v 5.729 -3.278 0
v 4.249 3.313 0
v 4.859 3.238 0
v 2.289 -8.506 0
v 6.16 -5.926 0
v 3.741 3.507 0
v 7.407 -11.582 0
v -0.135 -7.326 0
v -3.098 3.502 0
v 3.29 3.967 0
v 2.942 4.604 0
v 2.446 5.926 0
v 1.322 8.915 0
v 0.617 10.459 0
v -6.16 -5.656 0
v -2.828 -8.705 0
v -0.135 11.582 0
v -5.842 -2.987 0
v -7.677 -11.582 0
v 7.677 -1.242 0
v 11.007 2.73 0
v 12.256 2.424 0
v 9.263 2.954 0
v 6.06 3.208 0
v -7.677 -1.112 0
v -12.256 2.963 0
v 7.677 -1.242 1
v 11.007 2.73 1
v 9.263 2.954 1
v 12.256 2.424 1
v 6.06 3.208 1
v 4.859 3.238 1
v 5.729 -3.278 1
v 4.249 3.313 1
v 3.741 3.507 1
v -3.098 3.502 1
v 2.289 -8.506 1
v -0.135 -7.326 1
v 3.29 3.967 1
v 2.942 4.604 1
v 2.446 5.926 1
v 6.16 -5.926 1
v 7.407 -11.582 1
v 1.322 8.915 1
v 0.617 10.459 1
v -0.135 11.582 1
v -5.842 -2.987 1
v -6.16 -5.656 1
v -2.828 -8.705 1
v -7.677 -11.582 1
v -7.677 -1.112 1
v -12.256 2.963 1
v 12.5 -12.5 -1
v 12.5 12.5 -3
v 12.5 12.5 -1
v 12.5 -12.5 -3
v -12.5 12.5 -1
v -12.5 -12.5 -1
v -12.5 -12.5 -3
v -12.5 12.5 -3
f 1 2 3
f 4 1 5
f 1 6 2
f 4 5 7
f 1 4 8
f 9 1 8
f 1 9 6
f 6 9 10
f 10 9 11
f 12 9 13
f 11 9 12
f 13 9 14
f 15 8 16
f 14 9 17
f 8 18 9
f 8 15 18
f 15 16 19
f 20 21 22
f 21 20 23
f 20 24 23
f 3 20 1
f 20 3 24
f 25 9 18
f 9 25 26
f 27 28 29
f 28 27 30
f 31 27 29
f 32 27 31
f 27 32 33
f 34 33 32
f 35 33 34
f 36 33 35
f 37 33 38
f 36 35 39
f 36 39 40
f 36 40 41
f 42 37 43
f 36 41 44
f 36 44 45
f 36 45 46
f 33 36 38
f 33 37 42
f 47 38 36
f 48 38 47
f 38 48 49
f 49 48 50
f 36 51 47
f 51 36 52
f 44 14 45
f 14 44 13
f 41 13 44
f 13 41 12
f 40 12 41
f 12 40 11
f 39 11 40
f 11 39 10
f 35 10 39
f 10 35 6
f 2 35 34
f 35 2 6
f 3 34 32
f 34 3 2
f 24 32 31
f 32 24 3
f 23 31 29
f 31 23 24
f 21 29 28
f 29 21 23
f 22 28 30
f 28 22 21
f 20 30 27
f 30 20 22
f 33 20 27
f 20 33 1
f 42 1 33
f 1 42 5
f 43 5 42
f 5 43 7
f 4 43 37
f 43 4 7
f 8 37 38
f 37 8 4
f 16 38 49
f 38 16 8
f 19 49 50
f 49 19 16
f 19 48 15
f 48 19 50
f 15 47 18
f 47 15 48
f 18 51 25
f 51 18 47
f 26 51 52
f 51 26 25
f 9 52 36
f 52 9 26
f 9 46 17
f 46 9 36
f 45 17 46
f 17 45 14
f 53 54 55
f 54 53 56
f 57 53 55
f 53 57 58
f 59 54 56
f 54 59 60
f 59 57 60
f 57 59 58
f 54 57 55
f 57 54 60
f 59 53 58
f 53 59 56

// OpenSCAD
// file: ../../external-resources/thumbnail-background.scad
module thumbnailBackground()
{
	color("green")
	translate([0, 0, -2])
	cube([25, 25, 2], center=true);	
}
// file: star.scad
// Module names are of the form poly_<inkscape-path-id>().  As a result,
// you can associate a polygon in this OpenSCAD program with the corresponding
// SVG element in the Inkscape document by looking for the XML element with
// the attribute id="inkscape-path-id".

module star(h=1)
{
  scale([25.4/90, -25.4/90, 1]) union()
  {
    linear_extrude(height=h)
      polygon([[9.080000,-22.000000],[10.922500,-17.093750],[12.213125,-14.728281],[13.890000,-13.020000],[15.773906,-12.298125],[18.041250,-12.022500],[22.500000,-11.910000],[34.390000,-10.968750],[40.862812,-10.133906],[45.500000,-9.000000],[28.500000,4.610000],[21.270000,12.170000],[22.870000,22.000000],[27.500000,43.000000],[8.500000,31.580000],[-0.500000,27.200000],[-10.500000,32.320000],[-28.500000,43.000000],[-22.870000,21.000000],[-21.690000,11.090000],[-28.500000,4.130000],[-45.500000,-11.000000],[-11.500000,-13.000000],[-0.500000,-43.000000],[2.289219,-38.828594],[4.908750,-33.096250],[9.080000,-22.000000]]);
  }
}

module starThumbnail()
{
	xyScale = 0.9544;
	scale([xyScale, xyScale, 1])
	star();	
}
// main file
use <star.scad>
use <../../external-resources/thumbnail-background.scad>

starThumbnail();

thumbnailBackground();
